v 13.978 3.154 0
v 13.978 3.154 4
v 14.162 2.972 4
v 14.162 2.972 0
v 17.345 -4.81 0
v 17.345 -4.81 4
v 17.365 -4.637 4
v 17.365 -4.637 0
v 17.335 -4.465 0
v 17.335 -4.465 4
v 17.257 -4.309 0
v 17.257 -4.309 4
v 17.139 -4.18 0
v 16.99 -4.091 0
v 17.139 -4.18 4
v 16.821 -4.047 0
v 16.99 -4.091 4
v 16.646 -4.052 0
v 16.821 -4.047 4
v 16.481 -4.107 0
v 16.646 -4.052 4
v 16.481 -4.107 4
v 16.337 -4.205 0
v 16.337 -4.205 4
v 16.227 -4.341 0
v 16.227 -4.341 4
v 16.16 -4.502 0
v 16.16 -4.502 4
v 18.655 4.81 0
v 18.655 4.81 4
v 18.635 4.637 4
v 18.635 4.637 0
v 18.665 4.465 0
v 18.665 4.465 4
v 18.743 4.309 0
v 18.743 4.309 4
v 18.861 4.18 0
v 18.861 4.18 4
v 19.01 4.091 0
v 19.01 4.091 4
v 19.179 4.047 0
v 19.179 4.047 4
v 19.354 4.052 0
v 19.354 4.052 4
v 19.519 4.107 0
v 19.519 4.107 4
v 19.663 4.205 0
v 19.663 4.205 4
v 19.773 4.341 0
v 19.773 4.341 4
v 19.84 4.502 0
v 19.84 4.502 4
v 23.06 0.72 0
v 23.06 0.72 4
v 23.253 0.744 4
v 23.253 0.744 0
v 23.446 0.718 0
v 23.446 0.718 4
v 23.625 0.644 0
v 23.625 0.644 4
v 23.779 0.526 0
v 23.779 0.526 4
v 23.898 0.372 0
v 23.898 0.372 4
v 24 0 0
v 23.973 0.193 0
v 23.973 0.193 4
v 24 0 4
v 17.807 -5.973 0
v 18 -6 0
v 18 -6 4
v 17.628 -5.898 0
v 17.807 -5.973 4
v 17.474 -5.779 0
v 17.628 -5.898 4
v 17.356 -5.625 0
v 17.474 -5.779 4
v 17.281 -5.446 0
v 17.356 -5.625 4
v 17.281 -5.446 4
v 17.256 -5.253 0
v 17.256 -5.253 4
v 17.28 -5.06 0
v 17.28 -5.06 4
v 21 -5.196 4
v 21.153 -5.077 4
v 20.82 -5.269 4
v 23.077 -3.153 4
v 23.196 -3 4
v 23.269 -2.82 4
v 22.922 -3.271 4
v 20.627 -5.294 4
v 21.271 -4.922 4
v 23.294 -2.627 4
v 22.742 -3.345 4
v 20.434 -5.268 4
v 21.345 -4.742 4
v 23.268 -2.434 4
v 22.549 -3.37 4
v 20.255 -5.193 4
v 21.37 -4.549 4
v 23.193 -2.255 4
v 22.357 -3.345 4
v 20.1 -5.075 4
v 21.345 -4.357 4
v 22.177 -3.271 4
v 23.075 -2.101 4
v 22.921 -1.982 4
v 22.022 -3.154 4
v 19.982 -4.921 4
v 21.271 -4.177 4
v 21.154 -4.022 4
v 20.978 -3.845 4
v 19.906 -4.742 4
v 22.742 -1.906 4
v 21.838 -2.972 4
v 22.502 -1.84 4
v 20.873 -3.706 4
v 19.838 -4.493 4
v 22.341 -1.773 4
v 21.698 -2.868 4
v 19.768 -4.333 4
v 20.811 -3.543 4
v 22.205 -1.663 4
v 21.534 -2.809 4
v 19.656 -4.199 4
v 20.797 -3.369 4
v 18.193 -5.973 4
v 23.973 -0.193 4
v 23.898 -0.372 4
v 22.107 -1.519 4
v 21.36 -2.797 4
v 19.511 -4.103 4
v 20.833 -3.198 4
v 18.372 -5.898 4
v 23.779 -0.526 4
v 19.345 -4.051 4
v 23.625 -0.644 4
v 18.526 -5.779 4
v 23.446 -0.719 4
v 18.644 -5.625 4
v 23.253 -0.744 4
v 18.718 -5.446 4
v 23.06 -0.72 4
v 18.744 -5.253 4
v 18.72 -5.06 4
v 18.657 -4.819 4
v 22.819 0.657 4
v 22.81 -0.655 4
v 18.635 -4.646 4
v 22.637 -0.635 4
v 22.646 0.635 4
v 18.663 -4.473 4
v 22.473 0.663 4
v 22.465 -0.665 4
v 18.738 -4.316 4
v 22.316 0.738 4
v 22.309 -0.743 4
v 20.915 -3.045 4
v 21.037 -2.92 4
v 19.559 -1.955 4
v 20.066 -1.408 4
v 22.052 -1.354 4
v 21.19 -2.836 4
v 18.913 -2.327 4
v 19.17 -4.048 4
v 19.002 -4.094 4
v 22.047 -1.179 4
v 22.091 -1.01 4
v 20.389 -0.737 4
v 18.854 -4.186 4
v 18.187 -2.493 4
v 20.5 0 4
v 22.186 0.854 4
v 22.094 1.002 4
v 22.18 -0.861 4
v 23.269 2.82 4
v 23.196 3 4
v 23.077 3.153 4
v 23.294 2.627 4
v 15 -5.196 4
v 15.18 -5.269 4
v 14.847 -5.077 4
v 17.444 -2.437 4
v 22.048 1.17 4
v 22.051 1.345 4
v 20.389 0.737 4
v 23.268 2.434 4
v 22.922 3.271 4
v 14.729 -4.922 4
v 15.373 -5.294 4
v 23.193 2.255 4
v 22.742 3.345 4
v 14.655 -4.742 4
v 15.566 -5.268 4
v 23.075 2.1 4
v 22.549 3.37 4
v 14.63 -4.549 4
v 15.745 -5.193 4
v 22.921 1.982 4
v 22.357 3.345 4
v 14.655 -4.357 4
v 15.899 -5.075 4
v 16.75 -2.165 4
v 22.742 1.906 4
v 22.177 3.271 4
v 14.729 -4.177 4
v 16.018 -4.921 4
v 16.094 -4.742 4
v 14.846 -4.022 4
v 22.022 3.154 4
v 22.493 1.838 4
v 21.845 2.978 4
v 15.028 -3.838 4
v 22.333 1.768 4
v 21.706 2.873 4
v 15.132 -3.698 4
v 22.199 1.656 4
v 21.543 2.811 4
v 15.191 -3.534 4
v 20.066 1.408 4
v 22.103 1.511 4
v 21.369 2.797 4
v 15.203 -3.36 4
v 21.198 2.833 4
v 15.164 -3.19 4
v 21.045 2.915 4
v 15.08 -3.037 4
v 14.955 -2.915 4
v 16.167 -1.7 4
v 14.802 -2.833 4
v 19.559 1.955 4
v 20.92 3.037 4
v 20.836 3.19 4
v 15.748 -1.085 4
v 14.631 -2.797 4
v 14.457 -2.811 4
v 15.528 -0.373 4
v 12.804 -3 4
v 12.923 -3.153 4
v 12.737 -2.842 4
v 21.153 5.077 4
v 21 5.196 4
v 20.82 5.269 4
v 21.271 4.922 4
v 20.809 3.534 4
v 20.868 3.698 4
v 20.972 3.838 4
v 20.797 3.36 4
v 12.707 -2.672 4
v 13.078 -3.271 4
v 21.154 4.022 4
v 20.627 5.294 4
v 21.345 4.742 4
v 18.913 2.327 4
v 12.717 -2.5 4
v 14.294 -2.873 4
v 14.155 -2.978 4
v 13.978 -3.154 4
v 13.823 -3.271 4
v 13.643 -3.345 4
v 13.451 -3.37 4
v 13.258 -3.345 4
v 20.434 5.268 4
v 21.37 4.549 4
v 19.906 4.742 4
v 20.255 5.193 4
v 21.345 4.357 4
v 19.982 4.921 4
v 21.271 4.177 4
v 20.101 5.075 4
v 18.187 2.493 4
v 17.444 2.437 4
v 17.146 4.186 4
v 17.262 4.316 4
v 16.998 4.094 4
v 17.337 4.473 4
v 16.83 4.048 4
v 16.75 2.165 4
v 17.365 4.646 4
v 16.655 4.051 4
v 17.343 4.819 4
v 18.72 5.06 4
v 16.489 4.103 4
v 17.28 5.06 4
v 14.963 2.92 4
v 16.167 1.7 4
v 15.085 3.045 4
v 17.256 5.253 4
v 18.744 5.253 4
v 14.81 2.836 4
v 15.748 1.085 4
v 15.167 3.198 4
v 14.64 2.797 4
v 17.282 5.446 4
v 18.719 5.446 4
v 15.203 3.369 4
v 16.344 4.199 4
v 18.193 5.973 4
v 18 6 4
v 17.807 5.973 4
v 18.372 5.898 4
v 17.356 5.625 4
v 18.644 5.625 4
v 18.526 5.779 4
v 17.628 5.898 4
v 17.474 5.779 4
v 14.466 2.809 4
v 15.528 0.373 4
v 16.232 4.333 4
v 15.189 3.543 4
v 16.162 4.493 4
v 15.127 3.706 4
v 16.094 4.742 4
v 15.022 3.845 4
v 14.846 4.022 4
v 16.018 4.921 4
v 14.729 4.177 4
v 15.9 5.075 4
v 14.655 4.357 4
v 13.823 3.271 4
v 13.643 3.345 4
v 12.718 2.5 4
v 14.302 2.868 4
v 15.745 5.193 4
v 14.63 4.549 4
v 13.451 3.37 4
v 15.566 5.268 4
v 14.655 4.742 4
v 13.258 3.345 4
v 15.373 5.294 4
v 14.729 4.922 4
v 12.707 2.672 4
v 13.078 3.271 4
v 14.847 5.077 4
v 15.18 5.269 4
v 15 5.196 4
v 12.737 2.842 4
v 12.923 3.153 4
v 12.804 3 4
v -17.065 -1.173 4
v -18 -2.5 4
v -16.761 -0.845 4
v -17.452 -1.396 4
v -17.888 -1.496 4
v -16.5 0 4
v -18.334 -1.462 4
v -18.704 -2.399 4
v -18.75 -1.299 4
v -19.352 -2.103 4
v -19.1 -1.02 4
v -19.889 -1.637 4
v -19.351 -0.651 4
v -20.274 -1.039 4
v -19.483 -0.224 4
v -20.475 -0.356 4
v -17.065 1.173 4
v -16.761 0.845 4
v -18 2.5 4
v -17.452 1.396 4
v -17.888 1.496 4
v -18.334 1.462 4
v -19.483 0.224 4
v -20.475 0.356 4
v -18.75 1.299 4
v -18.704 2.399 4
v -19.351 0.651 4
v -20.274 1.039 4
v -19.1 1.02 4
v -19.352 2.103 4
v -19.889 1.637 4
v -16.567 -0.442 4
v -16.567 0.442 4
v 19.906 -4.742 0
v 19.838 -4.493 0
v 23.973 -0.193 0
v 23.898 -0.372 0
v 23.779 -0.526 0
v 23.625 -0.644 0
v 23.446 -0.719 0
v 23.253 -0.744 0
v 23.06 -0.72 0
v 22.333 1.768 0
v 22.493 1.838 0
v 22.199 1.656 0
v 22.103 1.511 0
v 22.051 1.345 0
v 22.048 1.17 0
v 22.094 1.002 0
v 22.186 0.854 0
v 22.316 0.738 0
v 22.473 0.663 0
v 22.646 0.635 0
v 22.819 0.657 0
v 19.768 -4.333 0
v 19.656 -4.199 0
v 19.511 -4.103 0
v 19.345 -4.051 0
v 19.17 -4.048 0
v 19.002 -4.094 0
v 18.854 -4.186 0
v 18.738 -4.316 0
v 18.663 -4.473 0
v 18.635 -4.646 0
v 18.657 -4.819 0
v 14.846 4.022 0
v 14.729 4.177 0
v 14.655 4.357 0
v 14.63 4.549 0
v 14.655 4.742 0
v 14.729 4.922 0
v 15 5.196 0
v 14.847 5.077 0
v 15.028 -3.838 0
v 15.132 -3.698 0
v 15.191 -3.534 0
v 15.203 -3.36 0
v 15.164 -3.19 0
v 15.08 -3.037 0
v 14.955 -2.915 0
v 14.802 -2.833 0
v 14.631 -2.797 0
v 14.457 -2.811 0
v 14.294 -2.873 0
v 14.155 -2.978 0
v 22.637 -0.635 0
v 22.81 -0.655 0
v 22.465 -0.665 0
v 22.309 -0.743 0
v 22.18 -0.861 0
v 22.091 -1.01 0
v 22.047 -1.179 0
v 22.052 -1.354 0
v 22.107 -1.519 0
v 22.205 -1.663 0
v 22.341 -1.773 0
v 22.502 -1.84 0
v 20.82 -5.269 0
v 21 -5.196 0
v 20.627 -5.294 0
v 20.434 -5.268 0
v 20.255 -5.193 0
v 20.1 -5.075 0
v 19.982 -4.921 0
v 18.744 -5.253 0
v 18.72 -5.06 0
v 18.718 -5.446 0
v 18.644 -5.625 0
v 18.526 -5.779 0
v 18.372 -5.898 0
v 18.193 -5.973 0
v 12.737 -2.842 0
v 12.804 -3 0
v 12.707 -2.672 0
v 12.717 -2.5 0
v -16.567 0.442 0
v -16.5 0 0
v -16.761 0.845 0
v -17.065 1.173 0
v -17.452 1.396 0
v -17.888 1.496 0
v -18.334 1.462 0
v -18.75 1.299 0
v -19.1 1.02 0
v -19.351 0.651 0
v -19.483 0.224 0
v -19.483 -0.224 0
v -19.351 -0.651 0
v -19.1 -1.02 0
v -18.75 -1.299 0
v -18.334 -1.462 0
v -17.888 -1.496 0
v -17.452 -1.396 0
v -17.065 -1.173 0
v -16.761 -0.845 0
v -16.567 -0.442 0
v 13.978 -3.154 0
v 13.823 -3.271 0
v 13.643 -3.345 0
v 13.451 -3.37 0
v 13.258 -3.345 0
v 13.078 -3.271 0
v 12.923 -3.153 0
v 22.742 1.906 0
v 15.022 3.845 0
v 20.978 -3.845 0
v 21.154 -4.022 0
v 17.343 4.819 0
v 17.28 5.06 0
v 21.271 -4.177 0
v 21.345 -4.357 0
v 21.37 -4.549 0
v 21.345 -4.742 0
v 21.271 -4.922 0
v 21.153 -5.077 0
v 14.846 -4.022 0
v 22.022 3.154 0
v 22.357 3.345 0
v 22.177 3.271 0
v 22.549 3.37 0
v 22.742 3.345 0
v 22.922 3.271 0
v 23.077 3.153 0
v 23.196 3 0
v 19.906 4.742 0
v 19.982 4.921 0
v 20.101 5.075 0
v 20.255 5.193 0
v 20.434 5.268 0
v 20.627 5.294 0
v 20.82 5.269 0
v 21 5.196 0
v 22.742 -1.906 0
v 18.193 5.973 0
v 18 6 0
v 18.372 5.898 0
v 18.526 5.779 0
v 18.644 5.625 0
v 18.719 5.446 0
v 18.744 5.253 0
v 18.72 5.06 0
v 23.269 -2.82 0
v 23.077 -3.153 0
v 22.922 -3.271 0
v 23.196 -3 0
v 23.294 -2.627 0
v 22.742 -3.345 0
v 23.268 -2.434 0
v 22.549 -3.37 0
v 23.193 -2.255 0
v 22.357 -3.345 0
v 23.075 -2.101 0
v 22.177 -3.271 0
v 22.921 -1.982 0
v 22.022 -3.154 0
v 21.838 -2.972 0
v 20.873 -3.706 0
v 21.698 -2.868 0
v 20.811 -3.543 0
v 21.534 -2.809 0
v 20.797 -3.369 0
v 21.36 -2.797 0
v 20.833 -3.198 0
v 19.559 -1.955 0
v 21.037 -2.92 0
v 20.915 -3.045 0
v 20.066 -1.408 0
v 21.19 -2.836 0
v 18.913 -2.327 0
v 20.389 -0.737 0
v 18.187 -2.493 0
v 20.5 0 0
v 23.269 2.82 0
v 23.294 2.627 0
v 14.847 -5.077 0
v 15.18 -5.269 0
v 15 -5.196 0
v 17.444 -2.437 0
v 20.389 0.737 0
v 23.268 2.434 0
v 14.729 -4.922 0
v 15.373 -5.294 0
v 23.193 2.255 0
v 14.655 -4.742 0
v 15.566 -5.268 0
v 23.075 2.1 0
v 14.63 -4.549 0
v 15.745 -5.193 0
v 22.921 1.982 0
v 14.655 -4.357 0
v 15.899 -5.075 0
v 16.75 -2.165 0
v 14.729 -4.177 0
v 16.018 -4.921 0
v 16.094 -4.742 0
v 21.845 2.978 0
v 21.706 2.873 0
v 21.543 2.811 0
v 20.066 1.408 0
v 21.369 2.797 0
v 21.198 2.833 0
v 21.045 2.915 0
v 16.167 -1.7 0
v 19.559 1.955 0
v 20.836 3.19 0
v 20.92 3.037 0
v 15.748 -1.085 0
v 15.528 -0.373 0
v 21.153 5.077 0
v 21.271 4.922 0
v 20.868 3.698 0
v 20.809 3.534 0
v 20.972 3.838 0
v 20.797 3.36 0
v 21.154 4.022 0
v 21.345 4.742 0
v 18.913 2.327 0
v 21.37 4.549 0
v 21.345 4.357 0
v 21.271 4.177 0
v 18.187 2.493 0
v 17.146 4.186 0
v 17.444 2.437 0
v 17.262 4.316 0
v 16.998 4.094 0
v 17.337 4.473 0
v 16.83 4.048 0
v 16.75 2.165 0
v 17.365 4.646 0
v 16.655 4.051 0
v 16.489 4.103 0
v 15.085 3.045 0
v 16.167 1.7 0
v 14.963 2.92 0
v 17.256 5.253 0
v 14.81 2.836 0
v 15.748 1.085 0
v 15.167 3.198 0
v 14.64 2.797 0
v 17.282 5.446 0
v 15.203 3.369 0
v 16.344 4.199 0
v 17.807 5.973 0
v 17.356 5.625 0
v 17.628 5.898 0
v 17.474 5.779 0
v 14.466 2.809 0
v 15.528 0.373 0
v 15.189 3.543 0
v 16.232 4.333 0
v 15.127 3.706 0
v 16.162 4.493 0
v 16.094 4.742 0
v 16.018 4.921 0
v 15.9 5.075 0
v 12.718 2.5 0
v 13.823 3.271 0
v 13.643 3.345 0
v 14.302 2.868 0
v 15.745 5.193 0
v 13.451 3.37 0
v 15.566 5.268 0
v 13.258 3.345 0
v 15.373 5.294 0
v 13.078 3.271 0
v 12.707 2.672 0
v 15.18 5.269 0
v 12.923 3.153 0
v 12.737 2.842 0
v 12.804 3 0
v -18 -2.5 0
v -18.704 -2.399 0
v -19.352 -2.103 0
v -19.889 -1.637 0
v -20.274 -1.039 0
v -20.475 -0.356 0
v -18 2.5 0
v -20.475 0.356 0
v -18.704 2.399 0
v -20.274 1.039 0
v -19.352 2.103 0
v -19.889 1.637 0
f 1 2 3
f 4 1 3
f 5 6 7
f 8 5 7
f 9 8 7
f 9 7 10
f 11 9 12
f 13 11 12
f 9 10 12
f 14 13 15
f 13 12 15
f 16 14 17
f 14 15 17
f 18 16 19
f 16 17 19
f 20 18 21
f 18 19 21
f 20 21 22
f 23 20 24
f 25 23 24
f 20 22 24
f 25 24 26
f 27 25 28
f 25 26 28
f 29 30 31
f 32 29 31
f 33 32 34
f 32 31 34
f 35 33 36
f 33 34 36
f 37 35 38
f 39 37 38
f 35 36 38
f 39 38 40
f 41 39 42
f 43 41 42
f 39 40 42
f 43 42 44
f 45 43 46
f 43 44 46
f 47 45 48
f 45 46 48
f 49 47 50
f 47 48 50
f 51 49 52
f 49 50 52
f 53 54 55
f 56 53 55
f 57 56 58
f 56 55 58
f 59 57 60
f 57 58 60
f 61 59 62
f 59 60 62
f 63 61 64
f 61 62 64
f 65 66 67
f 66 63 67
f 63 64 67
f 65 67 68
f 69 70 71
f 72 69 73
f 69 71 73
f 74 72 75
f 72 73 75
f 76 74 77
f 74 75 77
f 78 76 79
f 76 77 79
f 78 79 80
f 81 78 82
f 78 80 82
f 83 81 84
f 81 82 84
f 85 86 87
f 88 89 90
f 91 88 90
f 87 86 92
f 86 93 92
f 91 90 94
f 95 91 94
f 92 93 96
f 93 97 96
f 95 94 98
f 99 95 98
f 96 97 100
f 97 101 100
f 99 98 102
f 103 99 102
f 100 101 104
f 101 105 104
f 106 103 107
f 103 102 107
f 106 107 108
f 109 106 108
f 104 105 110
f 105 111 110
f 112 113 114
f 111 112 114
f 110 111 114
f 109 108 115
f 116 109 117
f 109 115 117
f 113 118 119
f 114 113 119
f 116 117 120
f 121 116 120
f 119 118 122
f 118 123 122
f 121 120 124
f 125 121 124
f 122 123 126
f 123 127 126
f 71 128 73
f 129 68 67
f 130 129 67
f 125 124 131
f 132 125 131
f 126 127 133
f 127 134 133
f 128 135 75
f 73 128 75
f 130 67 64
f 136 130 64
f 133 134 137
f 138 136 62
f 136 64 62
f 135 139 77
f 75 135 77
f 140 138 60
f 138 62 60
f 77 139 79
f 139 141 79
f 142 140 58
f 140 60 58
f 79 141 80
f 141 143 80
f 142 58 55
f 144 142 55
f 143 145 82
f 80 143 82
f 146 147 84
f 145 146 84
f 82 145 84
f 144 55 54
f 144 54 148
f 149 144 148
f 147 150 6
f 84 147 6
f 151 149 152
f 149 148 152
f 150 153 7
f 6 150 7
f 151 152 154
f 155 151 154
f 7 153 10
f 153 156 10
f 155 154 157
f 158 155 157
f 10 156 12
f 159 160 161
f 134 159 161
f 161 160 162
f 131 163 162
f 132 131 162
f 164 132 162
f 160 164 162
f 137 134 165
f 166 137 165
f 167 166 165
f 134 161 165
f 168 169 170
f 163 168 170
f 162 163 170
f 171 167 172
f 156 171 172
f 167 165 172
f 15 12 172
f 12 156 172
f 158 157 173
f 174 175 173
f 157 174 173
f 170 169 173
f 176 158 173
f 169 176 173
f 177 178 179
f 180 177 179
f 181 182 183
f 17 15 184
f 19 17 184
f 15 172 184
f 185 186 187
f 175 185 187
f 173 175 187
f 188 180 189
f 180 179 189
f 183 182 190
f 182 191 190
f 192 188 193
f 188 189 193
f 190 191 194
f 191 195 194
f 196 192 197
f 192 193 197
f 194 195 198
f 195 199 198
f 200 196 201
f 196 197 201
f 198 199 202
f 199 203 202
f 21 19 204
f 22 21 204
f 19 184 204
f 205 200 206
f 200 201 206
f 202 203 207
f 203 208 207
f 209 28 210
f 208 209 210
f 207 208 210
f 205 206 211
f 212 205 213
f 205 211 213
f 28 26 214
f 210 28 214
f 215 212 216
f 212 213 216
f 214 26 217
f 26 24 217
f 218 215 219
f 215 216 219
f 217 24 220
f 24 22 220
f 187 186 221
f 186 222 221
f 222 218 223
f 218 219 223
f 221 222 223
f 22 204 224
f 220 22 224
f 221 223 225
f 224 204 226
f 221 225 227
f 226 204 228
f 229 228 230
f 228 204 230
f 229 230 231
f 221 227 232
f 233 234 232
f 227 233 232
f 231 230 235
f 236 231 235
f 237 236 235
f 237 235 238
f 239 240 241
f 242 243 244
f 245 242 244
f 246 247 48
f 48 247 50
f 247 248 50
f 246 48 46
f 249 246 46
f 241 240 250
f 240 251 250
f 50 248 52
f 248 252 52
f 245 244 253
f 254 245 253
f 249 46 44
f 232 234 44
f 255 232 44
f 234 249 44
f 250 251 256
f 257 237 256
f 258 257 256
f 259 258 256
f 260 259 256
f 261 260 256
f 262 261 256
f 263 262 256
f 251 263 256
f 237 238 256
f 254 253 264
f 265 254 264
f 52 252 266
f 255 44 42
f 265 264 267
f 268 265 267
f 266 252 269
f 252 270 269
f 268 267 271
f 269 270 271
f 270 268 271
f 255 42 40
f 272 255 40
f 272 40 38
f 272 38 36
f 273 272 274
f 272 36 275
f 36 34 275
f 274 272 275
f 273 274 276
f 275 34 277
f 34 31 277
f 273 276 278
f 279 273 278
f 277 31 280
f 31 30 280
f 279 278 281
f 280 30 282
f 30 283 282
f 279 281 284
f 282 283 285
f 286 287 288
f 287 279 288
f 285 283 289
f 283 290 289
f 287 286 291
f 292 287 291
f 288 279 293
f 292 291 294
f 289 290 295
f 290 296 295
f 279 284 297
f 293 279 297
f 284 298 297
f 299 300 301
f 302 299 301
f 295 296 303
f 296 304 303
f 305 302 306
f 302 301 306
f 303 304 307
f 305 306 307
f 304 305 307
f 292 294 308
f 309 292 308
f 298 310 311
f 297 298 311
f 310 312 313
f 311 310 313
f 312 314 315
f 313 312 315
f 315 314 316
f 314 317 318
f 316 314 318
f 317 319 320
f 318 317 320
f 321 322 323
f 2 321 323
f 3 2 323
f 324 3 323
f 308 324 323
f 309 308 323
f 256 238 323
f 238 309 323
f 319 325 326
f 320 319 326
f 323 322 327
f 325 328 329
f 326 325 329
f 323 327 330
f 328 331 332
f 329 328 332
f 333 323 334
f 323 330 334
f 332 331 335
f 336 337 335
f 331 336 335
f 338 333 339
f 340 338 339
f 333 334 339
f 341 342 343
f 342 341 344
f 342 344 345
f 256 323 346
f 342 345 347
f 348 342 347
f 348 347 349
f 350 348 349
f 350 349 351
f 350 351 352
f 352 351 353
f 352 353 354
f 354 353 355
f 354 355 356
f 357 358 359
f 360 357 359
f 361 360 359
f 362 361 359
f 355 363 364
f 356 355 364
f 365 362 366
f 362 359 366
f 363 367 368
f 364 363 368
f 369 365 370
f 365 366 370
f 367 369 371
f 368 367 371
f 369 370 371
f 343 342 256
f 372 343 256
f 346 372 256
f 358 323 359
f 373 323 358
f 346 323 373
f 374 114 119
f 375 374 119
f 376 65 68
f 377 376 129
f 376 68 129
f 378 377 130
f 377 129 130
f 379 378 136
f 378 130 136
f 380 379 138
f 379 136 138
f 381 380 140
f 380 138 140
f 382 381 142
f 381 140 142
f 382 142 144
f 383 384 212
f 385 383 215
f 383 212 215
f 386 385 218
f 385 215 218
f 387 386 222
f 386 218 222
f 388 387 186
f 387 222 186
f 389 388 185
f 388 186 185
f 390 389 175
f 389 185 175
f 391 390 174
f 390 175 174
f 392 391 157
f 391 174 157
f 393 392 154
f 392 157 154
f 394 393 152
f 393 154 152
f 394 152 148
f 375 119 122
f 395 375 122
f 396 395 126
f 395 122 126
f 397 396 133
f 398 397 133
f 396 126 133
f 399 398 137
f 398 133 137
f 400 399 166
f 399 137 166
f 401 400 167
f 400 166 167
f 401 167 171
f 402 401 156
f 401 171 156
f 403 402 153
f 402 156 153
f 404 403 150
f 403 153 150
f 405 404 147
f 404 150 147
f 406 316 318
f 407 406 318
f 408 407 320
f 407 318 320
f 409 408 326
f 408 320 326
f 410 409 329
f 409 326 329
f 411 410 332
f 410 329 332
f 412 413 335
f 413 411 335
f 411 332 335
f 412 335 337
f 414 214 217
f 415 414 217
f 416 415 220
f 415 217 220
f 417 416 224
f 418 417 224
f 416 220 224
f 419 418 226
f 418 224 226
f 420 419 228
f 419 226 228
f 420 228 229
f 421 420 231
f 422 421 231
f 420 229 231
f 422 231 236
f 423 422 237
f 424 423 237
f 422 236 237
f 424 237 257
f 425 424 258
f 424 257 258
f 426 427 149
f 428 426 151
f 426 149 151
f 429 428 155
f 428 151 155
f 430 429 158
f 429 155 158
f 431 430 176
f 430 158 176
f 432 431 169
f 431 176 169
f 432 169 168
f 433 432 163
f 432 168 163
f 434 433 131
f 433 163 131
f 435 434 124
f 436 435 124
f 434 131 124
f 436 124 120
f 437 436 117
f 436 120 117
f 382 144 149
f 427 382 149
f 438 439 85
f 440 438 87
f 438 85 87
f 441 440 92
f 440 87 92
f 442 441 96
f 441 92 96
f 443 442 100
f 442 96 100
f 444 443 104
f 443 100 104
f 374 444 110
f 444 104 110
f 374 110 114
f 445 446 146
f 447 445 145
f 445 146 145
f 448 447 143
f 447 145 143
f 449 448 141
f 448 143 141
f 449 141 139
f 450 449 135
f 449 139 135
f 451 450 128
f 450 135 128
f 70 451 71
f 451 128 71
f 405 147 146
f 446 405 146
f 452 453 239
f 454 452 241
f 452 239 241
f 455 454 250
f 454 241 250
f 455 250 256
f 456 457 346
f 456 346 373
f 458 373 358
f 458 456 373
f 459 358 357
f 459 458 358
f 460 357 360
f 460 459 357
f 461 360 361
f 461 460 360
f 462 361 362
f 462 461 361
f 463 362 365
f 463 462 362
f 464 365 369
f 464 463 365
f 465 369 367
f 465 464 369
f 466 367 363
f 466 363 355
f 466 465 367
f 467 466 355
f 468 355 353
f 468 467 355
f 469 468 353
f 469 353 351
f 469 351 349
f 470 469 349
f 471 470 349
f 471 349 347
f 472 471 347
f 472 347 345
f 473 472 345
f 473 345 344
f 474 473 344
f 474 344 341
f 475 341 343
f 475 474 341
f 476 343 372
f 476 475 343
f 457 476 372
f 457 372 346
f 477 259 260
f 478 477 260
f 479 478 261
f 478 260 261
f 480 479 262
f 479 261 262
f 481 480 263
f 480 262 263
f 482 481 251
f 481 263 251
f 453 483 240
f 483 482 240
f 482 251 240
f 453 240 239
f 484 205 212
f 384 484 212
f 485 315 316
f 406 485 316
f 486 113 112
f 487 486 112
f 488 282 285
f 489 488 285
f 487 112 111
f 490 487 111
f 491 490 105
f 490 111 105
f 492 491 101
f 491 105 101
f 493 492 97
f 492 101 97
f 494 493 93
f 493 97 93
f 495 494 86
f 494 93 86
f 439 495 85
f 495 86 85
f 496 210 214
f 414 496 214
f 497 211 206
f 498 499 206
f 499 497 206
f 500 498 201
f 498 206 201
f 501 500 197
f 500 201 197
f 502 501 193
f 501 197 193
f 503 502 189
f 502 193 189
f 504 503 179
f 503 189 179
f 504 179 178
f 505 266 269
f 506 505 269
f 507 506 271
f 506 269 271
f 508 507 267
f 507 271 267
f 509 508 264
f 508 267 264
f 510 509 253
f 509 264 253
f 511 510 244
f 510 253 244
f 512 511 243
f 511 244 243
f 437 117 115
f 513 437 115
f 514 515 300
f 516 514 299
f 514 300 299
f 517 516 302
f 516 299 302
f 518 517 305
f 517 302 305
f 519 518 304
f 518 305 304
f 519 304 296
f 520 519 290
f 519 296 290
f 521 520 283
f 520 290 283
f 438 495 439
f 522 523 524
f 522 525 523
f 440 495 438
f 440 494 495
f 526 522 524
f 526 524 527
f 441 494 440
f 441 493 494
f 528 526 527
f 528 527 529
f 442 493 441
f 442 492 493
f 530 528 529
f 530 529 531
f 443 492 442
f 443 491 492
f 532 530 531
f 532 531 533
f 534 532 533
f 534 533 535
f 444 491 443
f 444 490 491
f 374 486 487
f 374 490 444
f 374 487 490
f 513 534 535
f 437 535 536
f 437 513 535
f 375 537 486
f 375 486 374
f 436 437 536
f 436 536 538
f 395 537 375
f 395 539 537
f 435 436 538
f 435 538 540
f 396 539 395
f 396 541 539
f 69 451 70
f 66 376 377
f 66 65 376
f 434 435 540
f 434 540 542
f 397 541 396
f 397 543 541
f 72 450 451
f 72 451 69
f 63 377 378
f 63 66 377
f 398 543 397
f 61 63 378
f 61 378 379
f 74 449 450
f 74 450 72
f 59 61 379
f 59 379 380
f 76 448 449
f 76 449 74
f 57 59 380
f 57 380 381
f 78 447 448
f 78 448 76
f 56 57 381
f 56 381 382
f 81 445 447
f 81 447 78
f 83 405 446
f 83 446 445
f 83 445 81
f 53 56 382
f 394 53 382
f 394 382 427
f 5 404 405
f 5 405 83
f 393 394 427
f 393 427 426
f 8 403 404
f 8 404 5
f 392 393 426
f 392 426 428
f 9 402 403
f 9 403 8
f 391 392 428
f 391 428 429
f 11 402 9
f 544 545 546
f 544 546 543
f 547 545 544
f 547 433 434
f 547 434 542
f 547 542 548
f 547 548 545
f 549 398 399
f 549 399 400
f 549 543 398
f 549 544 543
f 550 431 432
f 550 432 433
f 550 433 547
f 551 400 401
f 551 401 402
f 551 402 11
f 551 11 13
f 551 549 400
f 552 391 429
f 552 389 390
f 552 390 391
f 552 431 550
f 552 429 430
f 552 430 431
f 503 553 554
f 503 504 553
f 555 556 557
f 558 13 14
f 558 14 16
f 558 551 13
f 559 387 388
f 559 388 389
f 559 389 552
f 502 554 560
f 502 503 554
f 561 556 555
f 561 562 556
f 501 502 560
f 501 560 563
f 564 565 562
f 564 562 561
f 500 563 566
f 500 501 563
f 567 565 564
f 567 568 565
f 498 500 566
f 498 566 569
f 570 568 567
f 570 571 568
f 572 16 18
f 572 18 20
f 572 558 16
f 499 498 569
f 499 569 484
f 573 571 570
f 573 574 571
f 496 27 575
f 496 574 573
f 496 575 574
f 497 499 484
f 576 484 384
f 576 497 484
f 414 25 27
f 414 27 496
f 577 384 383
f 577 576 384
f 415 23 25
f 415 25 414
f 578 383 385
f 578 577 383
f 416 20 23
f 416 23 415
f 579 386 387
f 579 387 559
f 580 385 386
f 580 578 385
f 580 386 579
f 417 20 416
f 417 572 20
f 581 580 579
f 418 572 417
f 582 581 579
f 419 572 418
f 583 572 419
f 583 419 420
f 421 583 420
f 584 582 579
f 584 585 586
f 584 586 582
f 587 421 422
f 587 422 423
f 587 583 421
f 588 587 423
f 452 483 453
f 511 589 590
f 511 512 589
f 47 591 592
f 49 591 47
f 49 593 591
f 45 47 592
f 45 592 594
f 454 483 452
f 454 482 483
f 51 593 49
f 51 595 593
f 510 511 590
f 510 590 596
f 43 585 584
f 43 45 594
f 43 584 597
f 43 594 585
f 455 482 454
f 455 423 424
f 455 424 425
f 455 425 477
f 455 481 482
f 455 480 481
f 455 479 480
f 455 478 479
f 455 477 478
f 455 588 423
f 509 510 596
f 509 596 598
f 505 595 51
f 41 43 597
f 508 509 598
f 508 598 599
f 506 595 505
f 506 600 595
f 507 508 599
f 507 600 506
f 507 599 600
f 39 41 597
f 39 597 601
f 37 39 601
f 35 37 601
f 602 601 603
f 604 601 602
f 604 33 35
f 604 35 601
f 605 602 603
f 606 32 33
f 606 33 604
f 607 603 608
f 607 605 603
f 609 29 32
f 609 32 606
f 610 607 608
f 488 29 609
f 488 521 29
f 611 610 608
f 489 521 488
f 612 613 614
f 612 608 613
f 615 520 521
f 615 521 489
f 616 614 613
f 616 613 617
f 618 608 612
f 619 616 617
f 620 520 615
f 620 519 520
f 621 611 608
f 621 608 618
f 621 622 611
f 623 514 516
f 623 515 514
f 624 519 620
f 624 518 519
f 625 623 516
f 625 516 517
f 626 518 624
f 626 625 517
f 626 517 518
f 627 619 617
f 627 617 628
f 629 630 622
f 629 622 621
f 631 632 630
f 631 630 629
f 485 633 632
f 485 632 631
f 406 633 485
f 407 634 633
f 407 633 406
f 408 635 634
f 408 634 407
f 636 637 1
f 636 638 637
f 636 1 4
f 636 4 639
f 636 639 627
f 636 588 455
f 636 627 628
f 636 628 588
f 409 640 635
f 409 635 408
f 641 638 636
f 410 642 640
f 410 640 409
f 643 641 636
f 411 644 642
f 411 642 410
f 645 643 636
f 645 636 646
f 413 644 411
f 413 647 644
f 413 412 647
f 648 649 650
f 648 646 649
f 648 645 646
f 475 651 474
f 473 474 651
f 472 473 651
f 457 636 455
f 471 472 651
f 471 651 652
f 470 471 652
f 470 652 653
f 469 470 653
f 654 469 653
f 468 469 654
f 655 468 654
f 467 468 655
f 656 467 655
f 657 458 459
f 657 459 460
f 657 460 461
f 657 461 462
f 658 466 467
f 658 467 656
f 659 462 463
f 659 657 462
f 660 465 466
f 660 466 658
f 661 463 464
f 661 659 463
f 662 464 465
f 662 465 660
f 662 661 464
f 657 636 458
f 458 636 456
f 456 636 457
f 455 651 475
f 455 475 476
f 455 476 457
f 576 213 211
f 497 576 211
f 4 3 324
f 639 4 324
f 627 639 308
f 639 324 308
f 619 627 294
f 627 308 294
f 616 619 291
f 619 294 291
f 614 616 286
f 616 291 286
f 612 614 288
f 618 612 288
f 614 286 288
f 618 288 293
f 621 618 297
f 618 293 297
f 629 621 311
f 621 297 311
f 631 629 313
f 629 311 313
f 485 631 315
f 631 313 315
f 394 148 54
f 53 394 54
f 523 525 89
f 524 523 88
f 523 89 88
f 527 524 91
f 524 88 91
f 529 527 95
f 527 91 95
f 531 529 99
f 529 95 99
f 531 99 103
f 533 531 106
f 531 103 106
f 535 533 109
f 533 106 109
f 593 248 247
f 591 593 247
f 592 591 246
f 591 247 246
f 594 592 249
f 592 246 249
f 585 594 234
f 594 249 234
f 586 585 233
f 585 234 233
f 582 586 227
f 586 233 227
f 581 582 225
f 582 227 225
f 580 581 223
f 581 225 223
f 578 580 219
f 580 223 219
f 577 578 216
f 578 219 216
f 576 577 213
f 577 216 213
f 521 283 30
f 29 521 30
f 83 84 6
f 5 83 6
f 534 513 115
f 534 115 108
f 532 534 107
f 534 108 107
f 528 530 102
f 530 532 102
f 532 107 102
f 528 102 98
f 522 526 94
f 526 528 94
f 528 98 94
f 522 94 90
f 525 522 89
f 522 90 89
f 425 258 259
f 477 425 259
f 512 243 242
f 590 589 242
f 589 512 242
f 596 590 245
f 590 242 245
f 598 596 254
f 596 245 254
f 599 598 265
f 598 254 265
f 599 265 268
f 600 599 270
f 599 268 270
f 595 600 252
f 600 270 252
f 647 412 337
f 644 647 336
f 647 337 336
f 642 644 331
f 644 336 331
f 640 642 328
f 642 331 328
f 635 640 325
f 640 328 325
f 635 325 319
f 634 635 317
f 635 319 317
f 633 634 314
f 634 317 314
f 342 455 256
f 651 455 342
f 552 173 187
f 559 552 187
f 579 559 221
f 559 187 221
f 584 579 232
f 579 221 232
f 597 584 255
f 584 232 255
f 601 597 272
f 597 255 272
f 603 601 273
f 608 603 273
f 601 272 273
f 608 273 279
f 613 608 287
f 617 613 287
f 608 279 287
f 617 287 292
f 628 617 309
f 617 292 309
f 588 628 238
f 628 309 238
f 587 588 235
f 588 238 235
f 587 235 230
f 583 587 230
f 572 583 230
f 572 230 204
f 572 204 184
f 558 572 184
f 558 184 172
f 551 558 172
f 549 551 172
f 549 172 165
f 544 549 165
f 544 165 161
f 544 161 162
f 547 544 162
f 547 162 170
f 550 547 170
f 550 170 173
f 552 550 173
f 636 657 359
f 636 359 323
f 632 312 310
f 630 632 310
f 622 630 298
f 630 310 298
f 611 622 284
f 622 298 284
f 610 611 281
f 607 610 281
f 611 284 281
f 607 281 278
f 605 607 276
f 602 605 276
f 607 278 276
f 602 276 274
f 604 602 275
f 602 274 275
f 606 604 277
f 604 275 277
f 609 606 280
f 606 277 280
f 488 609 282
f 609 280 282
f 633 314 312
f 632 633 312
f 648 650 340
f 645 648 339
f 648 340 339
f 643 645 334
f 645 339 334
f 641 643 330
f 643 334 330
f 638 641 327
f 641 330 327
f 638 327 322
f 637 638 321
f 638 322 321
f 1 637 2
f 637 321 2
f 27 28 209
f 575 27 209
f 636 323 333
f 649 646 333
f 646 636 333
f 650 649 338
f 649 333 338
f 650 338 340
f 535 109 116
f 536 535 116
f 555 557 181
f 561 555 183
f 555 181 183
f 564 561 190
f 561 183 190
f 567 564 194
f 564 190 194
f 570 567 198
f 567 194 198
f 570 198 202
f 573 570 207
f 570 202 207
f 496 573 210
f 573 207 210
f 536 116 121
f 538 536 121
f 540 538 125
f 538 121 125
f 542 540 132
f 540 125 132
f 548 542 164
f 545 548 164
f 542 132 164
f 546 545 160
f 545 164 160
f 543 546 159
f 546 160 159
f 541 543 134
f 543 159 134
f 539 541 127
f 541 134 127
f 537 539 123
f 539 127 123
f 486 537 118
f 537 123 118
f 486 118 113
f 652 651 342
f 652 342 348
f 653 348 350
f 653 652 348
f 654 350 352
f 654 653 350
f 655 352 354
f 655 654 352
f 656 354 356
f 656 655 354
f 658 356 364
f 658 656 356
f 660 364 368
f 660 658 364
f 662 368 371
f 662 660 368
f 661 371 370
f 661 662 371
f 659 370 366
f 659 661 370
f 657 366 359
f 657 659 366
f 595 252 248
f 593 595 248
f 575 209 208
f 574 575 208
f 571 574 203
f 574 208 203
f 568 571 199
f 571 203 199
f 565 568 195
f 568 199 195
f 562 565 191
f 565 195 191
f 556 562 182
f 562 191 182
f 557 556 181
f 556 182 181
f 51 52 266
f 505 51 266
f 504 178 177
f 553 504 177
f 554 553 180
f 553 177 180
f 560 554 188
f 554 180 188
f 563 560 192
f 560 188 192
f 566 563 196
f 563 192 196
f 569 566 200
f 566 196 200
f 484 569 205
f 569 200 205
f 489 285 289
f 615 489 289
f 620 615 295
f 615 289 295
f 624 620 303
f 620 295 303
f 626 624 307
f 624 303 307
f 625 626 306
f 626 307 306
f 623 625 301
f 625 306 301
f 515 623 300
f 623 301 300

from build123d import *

# Parameters (mm, degrees)
SKETCH1_R           = 1.5
BOSS_EXTRUDE1_DEPTH = 4
CUT_EXTRUDE2_DEPTH  = 26.059928172
CIRPATTERN1_COUNT   = 12
SKETCH3_W           = 9.640063732
SKETCH3_H           = 5
BOSS_EXTRUDE6_DEPTH = 4
SKETCH4_R           = 2.5
CUT_EXTRUDE3_DEPTH  = 26.059928172


with BuildPart() as part:
    # Sketch1 → Boss-Extrude1 (new body)
    with BuildSketch(Plane.XY):
        with BuildLine():
            Line((-18, 2.5), (12.545643943, 2.5))
            ThreePointArc((12.545643943, 2.5), (24, 0), (12.545643943, -2.5))
            Line((12.545643943, -2.5), (-18, -2.5))
            ThreePointArc((-18, -2.5), (-20.5, 0), (-18, 2.5))
        make_face()
        with Locations((-18, 0)):
            Circle(SKETCH1_R, mode=Mode.SUBTRACT)
    extrude(amount=BOSS_EXTRUDE1_DEPTH)

    # Sketch2 → Cut-Extrude2 (cut, through all)
    with BuildSketch(Plane.XY.offset(4)):
        with BuildLine():
            Line((18.72, 5.06), (18.654523502, 4.81))
            ThreePointArc((18.654523502, 4.81), (19.09327028, 4.062778187), (19.840492093, 4.501524965))
            Line((19.840492093, 4.501524965), (19.906461709, 4.742088543))
            ThreePointArc((19.906461709, 4.742088543), (20.342216866, 5.236479445), (21, 5.196152423))
            ThreePointArc((21, 5.196152423), (19.568400179, 5.853349156), (18, 6))
            ThreePointArc((18, 6), (18.589879661, 5.706078038), (18.72, 5.06))
        make_face()
    cut_extrude2 = extrude(amount=-CUT_EXTRUDE2_DEPTH, mode=Mode.SUBTRACT)

    # CirPattern1: Cut-Extrude2 ×12 about axis
    cirpattern1_axis = Axis((18, 0, 0), (0, 0, 1))
    for i in range(1, CIRPATTERN1_COUNT):
        add(cut_extrude2.rotate(cirpattern1_axis, i * 360 / CIRPATTERN1_COUNT), mode=Mode.SUBTRACT)

    # Sketch3 → Boss-Extrude6 (add)
    with BuildSketch(Plane.XY.offset(4)):
        with Locations((15.25827781, 0)):
            Rectangle(SKETCH3_W, SKETCH3_H)
    extrude(amount=-BOSS_EXTRUDE6_DEPTH)

    # Sketch4 → Cut-Extrude3 (cut, through all)
    with BuildSketch(Plane.XY.offset(4)):
        with Locations((18, 0)):
            Circle(SKETCH4_R)
    extrude(amount=-CUT_EXTRUDE3_DEPTH, mode=Mode.SUBTRACT)


solid = part.part
